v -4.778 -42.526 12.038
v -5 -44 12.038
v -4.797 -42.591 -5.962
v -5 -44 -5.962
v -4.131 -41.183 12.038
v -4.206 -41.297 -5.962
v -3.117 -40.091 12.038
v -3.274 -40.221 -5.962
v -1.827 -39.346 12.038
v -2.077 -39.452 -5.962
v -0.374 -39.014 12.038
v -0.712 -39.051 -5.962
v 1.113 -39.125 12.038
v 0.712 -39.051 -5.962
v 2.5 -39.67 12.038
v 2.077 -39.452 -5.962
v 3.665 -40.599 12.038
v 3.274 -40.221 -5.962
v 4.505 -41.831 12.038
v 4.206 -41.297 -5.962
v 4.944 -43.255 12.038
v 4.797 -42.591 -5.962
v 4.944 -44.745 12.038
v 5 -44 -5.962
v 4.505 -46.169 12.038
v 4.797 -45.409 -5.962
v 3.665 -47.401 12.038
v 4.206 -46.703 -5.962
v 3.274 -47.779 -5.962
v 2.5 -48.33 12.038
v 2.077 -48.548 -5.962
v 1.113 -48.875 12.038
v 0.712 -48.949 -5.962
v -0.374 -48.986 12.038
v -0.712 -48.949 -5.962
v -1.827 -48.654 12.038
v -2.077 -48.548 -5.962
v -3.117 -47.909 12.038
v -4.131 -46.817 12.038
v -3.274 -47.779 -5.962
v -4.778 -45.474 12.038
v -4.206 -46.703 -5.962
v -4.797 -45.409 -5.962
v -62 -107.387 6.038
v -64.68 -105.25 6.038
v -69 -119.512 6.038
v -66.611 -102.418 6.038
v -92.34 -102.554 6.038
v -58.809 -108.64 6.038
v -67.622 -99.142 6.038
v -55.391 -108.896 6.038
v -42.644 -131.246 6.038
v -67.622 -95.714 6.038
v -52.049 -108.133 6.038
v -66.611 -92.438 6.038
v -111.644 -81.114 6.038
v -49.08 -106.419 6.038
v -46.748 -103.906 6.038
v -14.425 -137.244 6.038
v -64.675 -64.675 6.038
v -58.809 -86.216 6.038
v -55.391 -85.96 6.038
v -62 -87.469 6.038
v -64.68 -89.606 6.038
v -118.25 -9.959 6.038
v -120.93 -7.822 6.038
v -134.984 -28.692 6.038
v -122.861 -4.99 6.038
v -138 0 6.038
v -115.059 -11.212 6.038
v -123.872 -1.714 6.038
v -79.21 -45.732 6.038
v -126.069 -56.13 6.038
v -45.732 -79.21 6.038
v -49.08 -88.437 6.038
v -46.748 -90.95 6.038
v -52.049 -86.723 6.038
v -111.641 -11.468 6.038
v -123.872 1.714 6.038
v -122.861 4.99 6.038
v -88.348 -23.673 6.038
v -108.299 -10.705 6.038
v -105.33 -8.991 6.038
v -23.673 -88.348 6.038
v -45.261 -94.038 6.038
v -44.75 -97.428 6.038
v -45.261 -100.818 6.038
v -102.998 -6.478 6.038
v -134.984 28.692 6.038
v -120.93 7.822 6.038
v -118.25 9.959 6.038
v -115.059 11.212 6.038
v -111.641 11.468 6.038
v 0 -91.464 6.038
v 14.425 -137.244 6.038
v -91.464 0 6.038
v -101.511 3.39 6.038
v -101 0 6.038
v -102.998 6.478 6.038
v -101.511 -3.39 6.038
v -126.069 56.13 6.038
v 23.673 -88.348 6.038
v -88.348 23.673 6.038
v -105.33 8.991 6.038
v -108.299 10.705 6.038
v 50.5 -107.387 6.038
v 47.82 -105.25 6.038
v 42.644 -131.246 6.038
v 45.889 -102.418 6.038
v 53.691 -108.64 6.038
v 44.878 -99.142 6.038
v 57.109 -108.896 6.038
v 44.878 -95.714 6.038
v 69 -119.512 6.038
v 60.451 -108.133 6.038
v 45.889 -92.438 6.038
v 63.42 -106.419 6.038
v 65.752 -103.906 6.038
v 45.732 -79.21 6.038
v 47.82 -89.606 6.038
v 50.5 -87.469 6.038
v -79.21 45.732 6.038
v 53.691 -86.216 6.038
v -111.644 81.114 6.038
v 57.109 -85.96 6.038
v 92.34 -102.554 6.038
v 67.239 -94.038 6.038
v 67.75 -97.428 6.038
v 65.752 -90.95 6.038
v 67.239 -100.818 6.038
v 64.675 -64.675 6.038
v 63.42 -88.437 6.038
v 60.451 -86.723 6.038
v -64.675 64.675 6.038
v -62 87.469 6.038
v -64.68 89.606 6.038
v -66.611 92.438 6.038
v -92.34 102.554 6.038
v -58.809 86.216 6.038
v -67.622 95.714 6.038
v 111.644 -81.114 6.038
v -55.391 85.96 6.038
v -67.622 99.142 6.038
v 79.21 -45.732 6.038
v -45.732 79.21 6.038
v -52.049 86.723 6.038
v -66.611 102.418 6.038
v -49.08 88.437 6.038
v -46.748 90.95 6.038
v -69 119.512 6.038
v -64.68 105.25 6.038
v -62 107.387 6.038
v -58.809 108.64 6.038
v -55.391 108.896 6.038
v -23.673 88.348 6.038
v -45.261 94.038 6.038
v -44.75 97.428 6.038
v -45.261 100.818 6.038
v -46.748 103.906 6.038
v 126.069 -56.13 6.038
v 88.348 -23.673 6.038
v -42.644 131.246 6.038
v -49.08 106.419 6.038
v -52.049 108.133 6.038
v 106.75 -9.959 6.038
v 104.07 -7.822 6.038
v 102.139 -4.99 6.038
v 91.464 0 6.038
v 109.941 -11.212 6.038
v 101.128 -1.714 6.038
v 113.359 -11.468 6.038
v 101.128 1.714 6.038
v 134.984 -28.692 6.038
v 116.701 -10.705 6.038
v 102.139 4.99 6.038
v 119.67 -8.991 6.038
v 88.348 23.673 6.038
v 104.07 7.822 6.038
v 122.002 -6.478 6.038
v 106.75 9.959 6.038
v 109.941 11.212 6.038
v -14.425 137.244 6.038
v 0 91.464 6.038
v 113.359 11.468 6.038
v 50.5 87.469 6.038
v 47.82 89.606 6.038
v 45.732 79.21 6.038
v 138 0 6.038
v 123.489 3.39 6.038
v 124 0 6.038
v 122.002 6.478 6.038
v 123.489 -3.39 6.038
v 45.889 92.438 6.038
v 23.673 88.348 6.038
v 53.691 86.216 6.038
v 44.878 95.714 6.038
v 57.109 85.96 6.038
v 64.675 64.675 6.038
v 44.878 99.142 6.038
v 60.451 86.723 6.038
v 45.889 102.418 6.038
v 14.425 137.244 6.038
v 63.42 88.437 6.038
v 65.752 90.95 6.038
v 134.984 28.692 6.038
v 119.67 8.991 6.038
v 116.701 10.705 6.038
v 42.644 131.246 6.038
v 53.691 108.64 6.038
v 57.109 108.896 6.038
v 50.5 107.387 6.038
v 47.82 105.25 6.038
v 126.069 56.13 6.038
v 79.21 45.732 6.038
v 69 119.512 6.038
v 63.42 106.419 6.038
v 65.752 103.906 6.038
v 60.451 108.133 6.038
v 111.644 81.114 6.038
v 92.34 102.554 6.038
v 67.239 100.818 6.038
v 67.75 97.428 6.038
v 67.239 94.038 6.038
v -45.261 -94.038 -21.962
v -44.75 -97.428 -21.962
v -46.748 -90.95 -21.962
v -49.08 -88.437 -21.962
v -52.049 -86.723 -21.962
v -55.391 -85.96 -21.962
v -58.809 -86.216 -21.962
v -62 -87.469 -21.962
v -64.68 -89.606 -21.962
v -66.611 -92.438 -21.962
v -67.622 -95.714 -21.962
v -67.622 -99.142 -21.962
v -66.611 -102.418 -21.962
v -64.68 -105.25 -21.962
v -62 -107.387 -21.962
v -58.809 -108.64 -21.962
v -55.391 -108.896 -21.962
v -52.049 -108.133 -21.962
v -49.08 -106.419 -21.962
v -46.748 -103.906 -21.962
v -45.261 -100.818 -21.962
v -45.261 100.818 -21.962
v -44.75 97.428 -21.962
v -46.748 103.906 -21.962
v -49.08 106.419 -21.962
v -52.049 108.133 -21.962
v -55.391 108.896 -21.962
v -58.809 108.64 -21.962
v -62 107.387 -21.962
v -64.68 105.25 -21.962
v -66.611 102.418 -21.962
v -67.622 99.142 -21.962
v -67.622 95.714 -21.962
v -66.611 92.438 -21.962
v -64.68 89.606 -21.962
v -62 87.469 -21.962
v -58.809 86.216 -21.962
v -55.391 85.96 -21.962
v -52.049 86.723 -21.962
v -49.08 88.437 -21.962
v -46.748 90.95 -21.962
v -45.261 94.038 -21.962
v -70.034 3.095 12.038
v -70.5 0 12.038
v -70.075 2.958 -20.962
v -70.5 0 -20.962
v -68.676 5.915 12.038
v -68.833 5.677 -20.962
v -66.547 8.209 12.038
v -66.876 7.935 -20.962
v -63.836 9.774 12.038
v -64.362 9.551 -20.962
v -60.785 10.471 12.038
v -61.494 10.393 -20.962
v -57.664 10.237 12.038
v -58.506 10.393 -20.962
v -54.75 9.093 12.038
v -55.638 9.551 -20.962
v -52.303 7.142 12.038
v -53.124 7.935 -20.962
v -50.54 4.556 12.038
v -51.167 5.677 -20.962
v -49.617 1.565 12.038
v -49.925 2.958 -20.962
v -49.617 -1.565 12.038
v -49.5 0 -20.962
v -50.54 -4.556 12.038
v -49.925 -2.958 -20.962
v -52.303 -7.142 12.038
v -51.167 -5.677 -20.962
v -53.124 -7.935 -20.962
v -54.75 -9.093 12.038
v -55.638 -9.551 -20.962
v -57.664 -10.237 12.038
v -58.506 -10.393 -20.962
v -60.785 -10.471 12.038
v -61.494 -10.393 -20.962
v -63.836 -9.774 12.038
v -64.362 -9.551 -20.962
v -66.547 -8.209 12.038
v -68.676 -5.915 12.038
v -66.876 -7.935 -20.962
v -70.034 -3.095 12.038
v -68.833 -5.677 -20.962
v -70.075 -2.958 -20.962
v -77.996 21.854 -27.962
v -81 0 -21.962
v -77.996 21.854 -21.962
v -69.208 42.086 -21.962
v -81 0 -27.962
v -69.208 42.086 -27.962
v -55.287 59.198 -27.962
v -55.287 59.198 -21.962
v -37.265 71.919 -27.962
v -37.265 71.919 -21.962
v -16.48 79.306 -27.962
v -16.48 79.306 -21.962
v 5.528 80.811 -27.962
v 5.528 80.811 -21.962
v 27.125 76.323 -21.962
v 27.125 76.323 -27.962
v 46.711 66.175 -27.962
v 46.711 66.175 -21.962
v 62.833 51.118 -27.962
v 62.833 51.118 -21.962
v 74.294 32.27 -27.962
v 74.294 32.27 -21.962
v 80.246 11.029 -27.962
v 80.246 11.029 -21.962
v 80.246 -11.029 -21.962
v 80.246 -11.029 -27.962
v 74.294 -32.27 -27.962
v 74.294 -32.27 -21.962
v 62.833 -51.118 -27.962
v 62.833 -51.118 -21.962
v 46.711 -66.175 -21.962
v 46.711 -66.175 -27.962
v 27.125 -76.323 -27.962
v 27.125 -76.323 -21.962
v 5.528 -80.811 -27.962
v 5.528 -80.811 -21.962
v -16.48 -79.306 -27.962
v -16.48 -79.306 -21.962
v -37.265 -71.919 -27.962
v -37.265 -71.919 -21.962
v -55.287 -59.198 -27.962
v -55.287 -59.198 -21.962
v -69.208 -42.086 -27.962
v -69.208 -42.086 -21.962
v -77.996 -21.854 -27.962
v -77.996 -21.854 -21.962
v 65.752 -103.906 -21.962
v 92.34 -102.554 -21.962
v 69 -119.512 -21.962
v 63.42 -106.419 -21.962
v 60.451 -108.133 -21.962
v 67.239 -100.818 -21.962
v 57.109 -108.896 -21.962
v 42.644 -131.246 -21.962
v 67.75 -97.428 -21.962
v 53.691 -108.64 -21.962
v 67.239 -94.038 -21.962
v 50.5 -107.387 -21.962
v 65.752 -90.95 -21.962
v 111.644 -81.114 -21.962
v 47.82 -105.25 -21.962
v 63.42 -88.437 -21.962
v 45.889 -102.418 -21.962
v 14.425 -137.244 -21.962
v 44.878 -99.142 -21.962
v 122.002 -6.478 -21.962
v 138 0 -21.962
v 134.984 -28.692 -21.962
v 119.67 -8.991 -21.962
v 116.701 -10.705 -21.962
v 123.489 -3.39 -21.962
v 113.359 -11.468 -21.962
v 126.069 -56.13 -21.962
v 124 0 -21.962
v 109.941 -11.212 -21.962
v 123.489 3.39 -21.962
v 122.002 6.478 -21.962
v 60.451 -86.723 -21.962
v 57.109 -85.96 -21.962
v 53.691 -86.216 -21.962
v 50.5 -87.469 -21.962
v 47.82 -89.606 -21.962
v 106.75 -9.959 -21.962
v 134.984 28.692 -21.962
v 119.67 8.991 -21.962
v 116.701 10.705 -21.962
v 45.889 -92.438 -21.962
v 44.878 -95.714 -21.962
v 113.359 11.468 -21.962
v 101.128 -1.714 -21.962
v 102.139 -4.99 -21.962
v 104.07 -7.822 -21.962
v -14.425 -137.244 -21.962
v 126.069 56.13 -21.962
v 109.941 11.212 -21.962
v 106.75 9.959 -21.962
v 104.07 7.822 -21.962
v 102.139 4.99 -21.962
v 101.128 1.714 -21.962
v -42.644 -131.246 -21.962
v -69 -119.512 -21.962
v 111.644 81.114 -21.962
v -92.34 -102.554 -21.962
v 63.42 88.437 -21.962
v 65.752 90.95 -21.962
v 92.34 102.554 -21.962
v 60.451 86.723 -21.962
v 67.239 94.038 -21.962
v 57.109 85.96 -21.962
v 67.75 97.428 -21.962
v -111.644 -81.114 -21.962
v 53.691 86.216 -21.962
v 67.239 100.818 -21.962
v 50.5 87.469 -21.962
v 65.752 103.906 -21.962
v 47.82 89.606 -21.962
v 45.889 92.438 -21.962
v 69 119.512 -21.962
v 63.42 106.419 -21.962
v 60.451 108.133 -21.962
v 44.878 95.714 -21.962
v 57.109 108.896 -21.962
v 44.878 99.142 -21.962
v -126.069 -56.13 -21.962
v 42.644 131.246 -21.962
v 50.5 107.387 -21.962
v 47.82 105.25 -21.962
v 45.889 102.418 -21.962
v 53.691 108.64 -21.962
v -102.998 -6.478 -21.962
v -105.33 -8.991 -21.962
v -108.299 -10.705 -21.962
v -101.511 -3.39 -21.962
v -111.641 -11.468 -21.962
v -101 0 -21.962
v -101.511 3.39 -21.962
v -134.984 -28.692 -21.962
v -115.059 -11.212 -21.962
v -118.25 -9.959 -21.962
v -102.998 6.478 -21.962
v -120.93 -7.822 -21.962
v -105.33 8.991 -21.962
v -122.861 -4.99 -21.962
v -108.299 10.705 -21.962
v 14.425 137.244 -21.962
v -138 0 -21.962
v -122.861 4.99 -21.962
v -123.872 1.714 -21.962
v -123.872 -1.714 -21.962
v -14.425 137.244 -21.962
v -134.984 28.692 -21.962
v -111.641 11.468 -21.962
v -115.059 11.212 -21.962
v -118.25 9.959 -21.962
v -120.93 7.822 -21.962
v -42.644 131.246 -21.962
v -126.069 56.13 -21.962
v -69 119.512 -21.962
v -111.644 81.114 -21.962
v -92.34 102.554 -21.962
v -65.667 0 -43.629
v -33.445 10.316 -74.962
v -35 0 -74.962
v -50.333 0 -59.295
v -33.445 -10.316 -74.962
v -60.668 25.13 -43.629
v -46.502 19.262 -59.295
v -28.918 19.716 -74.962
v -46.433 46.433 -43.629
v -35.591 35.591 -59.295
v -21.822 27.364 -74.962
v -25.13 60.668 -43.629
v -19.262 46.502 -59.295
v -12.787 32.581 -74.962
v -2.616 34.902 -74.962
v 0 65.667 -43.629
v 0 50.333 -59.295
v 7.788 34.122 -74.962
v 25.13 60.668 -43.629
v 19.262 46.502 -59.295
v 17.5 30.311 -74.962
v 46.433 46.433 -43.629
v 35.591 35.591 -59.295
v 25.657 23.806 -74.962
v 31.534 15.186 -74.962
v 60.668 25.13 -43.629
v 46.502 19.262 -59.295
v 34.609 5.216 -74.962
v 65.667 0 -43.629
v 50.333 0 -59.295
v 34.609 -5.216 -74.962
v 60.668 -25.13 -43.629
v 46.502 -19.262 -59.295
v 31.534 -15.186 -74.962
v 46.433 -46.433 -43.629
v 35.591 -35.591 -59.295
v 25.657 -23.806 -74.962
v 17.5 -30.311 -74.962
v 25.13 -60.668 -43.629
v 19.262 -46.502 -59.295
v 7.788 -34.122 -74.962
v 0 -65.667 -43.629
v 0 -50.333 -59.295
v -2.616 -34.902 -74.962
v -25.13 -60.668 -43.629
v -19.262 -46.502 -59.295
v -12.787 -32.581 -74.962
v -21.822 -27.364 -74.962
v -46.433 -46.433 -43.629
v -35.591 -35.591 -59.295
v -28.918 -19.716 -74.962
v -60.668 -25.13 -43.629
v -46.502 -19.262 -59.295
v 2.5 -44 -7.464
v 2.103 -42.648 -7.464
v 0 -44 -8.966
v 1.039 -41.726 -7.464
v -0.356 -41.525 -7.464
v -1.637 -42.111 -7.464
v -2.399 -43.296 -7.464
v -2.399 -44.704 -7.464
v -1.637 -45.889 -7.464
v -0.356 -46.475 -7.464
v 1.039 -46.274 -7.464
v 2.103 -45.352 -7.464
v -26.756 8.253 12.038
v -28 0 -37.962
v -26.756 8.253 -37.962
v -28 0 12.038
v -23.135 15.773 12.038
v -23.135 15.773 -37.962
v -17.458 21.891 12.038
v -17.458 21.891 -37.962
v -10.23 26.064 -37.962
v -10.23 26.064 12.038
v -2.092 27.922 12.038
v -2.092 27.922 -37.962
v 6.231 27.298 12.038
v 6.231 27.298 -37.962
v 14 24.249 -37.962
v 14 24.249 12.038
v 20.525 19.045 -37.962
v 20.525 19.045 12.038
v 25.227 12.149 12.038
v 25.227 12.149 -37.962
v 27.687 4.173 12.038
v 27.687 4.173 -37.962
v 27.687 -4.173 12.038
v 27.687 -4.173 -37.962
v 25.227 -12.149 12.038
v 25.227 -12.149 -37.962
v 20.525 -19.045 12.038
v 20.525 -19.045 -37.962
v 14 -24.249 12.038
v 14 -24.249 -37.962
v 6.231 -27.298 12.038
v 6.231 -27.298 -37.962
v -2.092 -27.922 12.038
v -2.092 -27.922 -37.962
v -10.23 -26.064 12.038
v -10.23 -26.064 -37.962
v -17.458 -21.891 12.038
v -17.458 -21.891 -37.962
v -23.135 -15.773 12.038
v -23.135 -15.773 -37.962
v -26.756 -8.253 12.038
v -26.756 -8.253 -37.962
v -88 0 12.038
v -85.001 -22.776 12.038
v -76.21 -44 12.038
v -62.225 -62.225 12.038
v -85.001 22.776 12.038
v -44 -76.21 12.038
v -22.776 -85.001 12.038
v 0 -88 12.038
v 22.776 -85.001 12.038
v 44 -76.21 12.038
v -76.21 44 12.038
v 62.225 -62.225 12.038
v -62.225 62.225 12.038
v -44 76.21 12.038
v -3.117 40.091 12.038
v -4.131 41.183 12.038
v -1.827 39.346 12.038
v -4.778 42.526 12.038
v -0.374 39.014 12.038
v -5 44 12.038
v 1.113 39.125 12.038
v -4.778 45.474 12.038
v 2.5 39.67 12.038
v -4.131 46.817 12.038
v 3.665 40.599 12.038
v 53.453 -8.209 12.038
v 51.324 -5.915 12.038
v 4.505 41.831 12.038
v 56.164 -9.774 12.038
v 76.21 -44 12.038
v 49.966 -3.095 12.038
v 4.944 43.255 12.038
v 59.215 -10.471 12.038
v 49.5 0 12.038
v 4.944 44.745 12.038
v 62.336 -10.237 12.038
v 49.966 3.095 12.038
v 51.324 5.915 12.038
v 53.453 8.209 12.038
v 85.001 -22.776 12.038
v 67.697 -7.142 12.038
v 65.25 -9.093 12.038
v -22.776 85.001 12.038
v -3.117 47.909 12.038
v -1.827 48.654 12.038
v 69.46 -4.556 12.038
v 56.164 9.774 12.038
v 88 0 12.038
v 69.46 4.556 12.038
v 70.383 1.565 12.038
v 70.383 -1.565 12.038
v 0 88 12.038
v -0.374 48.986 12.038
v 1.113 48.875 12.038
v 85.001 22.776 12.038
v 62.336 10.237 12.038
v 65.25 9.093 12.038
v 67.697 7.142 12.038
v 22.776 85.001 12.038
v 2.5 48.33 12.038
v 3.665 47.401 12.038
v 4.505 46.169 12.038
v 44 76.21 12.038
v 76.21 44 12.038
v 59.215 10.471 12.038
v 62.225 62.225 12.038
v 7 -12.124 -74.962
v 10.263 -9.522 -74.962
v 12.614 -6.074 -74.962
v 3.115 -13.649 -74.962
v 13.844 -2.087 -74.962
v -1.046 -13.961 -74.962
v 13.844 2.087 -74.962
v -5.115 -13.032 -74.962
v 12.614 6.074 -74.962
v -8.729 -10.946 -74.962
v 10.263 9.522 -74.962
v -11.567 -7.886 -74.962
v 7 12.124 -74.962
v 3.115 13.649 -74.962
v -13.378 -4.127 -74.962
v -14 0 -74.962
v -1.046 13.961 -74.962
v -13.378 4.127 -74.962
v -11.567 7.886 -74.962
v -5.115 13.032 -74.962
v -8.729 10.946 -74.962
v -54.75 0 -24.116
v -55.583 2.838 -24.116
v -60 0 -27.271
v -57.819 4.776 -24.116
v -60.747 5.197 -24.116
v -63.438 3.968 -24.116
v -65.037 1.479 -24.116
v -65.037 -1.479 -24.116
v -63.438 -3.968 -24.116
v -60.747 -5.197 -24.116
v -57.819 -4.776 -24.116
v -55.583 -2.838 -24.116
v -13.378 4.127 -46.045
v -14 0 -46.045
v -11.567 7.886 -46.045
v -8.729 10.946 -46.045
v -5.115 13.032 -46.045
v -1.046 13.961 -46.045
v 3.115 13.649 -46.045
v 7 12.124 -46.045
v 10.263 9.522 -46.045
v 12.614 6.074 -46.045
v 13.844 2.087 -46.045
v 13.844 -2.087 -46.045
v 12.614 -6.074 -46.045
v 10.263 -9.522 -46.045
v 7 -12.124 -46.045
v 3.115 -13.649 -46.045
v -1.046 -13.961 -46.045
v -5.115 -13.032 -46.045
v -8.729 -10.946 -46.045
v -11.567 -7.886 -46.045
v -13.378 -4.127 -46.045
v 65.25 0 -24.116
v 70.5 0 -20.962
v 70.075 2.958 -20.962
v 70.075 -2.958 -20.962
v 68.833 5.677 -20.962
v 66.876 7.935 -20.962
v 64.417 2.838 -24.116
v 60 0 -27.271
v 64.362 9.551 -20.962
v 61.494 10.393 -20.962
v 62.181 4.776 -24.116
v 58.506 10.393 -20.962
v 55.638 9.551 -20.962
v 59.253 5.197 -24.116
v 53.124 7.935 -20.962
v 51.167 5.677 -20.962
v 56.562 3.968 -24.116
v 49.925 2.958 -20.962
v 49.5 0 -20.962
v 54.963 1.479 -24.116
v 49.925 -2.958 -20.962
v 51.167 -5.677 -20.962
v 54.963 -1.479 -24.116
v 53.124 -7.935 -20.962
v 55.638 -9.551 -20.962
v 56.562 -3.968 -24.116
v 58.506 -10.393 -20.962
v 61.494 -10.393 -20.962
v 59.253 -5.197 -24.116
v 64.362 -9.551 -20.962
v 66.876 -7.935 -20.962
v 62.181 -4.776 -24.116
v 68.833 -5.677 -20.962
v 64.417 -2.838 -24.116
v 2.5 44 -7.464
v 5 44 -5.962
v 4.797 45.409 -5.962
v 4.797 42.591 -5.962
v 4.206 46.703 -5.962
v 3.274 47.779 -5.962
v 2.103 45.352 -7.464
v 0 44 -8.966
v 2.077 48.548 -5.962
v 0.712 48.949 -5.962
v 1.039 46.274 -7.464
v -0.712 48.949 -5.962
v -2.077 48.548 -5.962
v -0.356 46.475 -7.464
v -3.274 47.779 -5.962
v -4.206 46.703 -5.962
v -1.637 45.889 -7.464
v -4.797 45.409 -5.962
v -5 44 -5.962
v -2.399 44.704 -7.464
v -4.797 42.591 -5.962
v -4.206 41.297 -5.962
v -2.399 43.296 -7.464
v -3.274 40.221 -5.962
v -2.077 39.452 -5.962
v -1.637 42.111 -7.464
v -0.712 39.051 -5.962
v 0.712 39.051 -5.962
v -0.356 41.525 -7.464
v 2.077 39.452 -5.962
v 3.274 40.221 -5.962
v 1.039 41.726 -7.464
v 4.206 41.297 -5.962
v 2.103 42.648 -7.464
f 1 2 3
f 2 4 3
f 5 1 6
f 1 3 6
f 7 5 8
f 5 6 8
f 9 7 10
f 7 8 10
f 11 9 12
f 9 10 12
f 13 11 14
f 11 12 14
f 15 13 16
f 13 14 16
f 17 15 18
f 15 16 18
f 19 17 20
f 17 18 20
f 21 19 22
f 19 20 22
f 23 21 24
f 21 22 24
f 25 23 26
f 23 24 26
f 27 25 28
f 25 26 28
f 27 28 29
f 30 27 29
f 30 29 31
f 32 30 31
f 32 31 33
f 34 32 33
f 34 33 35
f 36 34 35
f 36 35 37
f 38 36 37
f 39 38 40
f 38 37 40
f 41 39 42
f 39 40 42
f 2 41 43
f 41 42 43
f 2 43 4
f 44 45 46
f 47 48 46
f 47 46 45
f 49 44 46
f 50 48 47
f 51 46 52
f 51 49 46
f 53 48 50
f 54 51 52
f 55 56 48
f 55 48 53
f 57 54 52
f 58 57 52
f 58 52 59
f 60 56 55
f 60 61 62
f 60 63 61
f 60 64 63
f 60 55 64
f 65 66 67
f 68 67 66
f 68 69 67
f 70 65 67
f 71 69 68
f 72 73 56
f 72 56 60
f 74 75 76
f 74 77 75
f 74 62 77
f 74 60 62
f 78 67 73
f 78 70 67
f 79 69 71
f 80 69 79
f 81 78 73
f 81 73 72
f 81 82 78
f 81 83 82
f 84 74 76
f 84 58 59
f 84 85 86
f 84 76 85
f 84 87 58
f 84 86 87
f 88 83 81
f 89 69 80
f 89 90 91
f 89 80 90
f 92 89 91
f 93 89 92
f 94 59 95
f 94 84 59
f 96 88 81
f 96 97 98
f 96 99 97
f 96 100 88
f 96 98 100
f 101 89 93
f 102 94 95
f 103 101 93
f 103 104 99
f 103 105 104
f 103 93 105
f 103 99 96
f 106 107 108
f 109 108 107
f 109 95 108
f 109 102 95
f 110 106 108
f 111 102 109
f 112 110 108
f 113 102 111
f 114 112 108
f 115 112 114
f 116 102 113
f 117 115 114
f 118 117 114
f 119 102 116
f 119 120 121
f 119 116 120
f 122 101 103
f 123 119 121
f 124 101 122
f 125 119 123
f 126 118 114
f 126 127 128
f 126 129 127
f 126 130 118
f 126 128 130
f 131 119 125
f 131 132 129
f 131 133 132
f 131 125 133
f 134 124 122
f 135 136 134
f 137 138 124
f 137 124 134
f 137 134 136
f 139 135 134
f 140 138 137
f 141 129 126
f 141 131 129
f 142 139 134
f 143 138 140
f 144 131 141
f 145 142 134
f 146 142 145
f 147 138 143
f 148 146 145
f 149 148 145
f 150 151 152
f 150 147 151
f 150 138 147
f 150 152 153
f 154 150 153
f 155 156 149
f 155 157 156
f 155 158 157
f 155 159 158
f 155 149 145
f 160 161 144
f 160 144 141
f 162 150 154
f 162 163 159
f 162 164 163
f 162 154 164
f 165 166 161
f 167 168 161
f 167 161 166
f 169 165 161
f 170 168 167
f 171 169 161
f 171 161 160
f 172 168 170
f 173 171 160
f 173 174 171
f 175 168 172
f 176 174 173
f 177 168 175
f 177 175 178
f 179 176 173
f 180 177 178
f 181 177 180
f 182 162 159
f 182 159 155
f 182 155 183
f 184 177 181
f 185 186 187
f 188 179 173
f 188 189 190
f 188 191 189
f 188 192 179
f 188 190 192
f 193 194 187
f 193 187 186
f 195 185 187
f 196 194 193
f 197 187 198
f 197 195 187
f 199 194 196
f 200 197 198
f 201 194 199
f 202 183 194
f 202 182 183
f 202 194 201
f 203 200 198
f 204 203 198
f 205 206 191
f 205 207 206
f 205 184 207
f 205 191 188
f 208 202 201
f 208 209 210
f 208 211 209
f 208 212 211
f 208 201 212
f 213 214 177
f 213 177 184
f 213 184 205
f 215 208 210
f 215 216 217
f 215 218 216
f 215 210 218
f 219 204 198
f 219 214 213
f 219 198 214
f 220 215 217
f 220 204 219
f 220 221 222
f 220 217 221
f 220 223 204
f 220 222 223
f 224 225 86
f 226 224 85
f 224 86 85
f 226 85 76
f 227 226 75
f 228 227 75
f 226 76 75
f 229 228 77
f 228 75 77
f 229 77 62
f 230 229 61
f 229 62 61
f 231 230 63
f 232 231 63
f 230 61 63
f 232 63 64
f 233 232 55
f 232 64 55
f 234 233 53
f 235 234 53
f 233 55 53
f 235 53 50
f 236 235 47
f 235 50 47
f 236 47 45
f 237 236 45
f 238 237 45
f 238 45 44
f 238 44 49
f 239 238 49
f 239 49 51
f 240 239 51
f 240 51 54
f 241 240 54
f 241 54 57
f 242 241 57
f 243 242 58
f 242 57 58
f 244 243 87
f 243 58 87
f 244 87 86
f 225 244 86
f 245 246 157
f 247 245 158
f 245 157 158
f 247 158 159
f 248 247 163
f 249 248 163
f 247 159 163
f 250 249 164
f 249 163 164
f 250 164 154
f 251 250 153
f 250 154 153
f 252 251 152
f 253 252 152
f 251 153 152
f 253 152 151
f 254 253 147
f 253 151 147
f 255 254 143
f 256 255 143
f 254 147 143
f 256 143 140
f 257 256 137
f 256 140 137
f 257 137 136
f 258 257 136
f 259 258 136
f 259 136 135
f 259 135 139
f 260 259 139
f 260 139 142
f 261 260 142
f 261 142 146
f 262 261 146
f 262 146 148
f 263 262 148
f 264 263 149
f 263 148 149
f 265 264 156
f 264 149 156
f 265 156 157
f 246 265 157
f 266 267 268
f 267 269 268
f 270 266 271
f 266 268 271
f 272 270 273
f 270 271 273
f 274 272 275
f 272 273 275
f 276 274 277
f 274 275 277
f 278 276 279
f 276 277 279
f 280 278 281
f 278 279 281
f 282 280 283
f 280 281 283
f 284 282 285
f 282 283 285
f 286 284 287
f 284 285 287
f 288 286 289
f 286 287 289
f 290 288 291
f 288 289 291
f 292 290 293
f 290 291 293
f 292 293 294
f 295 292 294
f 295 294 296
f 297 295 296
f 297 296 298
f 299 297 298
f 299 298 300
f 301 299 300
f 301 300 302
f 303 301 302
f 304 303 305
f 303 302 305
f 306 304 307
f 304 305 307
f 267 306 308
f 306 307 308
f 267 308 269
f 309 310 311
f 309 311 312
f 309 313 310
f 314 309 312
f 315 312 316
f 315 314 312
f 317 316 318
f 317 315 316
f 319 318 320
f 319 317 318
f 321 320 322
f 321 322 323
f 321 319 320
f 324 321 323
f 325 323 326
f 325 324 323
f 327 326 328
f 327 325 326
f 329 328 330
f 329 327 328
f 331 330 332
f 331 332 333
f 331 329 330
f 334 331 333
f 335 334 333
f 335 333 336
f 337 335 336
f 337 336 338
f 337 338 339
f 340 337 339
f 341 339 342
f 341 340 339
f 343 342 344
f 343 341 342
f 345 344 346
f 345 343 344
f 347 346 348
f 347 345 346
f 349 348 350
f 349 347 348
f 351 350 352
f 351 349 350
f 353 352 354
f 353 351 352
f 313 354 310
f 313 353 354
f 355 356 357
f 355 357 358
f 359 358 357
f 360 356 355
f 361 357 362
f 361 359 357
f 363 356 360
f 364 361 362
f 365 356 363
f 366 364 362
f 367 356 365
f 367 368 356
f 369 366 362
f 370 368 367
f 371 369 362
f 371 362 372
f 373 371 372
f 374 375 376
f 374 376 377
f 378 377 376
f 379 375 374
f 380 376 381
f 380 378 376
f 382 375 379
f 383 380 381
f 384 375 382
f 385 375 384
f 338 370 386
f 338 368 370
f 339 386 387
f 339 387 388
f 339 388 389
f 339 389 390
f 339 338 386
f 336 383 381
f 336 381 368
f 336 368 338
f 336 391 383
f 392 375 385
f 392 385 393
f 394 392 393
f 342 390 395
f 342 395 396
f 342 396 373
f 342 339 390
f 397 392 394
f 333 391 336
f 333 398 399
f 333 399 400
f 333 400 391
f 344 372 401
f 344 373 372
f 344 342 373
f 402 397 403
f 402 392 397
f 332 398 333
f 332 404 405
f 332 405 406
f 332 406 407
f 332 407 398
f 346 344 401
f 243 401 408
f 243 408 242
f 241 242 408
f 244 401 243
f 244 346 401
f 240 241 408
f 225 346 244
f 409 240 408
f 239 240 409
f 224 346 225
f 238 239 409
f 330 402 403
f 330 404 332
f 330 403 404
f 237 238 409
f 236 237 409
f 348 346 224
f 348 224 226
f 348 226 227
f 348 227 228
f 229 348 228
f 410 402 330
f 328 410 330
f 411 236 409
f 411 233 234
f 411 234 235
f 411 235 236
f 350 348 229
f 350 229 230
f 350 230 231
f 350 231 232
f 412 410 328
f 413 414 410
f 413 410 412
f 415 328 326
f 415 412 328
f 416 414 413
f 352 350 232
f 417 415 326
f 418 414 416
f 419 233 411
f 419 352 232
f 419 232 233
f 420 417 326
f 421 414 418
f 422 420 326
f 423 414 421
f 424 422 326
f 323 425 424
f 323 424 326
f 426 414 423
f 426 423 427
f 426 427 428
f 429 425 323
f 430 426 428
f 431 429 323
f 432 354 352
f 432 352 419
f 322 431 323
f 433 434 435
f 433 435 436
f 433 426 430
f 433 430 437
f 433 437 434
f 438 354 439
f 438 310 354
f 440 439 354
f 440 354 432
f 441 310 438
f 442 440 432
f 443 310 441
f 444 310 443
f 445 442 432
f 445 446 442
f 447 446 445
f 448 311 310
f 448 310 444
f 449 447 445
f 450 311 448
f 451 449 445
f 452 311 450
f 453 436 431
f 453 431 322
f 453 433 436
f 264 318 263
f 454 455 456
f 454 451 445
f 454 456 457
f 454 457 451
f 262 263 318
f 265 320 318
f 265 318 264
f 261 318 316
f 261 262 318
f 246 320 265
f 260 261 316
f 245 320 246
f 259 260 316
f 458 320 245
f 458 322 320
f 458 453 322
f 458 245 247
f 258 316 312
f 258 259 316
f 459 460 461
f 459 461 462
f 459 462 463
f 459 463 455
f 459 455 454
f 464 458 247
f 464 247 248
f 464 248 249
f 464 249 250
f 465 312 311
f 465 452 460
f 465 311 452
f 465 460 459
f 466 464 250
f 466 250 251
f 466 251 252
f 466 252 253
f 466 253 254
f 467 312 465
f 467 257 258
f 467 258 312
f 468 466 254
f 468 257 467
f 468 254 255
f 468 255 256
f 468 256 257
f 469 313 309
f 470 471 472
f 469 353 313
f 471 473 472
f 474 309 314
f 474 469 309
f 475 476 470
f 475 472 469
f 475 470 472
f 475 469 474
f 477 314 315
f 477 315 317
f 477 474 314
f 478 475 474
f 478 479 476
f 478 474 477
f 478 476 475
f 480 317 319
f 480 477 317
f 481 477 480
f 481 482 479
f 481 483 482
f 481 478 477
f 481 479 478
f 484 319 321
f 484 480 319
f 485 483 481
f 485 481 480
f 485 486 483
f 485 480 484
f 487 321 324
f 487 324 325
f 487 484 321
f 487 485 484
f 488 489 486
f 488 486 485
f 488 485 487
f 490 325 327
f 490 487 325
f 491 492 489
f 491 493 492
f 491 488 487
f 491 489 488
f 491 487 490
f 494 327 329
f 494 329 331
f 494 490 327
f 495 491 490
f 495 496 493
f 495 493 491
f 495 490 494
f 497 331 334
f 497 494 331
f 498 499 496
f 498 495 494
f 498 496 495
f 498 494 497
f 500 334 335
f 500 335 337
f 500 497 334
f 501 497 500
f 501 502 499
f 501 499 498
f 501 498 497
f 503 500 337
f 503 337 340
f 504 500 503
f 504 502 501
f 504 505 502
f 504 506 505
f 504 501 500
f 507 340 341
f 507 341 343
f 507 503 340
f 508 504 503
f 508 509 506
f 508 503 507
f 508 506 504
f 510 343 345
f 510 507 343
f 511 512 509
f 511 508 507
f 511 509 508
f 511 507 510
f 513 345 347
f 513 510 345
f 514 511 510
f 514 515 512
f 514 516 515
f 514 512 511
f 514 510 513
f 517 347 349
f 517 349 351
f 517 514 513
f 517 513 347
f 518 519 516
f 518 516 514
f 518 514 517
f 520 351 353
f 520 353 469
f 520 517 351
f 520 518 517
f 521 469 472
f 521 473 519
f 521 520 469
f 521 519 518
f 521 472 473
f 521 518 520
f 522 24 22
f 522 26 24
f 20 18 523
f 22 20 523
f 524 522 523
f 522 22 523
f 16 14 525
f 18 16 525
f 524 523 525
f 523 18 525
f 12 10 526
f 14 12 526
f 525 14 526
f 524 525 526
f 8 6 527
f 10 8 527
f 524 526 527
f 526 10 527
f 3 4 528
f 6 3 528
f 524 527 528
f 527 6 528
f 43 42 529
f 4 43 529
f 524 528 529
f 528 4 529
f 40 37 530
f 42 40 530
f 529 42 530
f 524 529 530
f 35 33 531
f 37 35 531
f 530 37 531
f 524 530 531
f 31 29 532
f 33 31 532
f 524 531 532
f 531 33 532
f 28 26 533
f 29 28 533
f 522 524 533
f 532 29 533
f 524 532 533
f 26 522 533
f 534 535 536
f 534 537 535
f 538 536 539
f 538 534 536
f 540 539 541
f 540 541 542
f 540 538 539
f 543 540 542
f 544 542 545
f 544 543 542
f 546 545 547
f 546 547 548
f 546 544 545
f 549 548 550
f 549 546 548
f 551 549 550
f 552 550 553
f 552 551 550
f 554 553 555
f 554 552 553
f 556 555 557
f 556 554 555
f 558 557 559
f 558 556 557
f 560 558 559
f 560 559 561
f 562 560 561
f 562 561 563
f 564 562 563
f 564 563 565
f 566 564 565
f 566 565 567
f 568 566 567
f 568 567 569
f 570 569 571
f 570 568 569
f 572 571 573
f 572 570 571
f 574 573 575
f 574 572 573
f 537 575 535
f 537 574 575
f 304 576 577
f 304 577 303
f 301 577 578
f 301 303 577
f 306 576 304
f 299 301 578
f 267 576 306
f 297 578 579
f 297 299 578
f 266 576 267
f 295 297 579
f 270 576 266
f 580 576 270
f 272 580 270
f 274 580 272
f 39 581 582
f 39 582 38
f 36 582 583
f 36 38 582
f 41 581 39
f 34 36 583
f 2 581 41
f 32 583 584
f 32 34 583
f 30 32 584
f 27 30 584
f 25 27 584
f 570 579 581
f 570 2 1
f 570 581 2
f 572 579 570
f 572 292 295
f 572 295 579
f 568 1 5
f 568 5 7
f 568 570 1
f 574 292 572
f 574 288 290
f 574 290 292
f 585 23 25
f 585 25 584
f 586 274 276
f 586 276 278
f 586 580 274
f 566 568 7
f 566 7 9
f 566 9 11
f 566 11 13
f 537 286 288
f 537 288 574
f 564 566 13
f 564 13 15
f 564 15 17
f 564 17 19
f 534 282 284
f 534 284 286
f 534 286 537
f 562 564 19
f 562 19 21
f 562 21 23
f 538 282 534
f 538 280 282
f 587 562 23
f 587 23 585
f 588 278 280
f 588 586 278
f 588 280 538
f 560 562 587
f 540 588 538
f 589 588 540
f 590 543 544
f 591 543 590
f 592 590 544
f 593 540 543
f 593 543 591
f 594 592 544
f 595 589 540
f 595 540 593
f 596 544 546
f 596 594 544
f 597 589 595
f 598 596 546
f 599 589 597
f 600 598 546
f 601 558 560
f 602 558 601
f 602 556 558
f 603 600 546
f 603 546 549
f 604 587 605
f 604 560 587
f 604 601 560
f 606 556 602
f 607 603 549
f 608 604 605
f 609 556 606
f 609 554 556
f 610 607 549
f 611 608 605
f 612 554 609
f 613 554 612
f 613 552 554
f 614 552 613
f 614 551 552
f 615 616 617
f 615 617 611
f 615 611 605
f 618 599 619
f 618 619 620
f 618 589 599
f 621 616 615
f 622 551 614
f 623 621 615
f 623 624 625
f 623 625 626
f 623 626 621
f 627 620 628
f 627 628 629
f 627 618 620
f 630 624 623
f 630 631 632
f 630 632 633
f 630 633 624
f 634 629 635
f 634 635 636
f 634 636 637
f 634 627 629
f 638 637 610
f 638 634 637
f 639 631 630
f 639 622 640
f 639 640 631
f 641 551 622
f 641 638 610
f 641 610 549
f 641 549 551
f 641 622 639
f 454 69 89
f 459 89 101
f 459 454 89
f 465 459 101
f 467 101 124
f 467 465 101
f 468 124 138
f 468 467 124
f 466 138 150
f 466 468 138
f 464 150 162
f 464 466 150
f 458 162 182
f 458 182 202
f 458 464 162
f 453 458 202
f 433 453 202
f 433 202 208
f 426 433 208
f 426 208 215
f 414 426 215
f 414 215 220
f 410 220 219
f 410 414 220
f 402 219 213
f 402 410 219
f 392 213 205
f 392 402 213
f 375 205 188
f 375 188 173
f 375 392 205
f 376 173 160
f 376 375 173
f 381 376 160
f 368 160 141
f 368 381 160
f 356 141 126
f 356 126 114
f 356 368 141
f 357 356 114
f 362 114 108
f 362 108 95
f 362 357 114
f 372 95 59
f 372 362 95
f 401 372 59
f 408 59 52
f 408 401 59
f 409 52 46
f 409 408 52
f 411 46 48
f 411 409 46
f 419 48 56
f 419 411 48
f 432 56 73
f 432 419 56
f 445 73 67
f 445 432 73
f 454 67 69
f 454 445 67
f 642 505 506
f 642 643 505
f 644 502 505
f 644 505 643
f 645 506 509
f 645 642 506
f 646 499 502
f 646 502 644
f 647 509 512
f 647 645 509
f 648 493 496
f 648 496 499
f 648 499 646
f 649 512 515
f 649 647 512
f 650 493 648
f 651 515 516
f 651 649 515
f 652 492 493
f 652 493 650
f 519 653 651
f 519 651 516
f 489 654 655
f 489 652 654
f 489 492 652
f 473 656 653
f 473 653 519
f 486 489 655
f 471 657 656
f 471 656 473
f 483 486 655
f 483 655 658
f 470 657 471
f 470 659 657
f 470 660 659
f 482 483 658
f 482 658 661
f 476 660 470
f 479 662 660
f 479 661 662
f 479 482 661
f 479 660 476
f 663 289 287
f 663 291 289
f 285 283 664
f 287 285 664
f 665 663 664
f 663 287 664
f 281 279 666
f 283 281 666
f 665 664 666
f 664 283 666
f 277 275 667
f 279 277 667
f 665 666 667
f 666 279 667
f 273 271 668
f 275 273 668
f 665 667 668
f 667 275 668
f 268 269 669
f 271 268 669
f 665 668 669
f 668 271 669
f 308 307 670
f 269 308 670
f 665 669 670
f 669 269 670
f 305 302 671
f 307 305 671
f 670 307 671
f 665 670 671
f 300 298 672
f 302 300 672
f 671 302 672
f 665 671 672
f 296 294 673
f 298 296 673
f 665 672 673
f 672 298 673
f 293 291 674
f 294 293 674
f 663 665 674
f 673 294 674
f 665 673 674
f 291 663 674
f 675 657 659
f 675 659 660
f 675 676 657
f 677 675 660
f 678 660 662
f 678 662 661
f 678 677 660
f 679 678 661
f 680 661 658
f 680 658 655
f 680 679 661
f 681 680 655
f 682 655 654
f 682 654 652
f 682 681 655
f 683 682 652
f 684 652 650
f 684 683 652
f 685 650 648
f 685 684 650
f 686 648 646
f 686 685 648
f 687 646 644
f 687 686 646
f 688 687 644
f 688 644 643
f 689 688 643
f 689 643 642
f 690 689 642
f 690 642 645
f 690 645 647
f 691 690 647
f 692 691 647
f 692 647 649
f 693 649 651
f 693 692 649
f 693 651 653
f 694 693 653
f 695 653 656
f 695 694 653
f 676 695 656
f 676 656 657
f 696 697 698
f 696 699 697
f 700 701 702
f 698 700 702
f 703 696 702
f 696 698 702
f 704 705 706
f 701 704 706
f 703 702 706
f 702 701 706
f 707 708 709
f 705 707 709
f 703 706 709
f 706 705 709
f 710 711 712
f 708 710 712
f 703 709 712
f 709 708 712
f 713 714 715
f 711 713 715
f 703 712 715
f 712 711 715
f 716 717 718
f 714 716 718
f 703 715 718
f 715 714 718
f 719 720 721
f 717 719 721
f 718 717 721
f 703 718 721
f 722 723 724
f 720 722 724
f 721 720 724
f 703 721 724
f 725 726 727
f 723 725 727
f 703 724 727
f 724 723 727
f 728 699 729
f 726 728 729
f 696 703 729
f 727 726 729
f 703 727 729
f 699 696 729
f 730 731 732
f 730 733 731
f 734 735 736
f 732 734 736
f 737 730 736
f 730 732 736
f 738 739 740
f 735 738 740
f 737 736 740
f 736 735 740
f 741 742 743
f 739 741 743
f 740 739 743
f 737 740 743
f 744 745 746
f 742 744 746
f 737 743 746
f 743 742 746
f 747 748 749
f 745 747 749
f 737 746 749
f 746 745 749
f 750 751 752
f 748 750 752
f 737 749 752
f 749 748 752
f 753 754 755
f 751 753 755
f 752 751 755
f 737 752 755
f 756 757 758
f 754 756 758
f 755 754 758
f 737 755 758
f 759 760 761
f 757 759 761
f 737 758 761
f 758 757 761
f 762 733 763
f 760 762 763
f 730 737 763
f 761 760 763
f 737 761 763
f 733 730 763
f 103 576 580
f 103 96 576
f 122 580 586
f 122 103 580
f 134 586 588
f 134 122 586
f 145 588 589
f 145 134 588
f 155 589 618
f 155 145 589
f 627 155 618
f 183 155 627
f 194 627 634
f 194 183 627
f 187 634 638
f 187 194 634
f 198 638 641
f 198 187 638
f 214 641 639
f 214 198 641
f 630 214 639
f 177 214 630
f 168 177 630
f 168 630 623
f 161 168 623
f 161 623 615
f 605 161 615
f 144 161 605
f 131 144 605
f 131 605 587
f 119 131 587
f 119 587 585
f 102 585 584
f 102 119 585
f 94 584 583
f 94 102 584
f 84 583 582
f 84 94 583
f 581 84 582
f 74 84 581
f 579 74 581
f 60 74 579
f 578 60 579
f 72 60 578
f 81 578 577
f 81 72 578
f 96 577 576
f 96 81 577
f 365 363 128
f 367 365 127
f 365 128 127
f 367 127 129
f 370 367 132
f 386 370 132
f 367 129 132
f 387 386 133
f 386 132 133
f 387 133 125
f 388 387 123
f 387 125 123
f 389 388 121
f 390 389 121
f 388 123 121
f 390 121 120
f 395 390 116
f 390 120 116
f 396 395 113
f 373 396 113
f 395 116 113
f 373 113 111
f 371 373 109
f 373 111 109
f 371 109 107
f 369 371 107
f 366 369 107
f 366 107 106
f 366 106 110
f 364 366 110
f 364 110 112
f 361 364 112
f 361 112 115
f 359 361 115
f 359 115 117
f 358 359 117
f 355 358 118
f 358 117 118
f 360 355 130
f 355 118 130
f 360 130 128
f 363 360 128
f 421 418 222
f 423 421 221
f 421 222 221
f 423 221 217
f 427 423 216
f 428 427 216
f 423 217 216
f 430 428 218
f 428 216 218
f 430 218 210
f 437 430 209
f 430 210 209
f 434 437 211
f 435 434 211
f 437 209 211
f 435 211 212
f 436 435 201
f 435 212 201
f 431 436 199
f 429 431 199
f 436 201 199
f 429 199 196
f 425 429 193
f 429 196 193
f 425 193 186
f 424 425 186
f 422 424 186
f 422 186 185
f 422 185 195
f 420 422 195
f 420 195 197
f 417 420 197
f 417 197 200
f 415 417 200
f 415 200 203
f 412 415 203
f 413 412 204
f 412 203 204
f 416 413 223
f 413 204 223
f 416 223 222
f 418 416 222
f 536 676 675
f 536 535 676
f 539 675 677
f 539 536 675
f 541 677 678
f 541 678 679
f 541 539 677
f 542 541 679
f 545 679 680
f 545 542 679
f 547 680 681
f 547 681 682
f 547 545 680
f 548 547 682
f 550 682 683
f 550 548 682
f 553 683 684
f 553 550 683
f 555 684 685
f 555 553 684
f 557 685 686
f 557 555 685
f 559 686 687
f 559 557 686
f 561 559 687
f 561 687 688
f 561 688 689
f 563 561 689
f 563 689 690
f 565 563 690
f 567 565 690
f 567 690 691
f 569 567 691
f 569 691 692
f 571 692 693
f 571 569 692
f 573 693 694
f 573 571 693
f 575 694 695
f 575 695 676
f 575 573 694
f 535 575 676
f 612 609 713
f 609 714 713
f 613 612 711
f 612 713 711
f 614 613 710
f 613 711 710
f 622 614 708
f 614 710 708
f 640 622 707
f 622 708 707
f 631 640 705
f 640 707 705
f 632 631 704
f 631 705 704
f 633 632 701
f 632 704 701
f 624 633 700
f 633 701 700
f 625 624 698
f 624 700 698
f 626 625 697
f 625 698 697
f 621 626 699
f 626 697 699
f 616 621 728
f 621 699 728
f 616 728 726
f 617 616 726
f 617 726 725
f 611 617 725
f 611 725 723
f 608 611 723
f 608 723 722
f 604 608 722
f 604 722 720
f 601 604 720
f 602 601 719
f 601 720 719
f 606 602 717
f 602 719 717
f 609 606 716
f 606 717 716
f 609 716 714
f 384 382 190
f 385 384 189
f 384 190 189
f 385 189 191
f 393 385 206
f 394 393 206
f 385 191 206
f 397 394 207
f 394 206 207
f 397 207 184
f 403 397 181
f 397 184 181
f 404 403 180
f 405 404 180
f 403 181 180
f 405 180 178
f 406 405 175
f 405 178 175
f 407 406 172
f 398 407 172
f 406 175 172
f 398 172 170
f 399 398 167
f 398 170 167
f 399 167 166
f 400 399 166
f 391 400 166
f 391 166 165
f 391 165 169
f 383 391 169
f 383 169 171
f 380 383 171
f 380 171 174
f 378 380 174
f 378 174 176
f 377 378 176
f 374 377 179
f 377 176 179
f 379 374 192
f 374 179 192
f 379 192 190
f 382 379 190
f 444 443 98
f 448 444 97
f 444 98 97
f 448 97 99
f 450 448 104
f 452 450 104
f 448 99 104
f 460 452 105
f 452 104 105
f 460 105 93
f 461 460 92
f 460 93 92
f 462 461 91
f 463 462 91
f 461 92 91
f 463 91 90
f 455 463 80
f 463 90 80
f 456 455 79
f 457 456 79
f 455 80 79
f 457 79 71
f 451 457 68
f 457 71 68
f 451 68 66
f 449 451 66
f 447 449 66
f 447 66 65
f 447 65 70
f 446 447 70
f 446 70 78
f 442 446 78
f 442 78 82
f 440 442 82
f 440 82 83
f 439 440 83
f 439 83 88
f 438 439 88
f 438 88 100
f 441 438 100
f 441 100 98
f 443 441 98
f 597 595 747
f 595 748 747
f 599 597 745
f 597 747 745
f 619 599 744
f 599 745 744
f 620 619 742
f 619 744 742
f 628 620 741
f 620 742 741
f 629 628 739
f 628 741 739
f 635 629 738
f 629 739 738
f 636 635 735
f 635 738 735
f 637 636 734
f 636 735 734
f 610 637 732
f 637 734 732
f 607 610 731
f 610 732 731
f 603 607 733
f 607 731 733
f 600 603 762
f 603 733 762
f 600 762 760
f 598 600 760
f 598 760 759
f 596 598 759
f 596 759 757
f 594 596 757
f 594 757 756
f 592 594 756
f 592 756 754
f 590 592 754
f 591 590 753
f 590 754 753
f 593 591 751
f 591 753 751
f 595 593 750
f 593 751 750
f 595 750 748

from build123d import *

# Parameters (mm, degrees)
F2_R     = 11.5
F3_DEPTH = 81.001
F4_DEPTH = 28
F6_D     = 21
F6_DEPTH = 33
F6_TIP   = 6.3090364998
F7_D     = 10
F7_DEPTH = 18
F7_TIP   = 3.0043030951


with BuildPart() as f1:
    # F0 (on Front) → F1 (revolve)
    with BuildSketch(Plane.XZ):
        Polygon((-28, -37.9619441777), (-28, 12.0380558223), (-88, 12.0380558223), (-91.4641016151, 6.0380558223), (-138, 6.0380558223), (-138, -21.9619441777), (-81, -21.9619441777), (-81, -27.9619441777), (-35, -74.9619441777), (-14, -74.9619441777), (-14, -46.0448479464), align=None)
    revolve(axis=Axis((0, 0, -17.8461521864), (0, 0, -1)))

    # F2 (on face) → F3 (cut, through all)
    with BuildSketch(Plane.XY.offset(6.0380558223)):
        with Locations((-112.5, 0)):
            Circle(F2_R)
    extrude(amount=-F3_DEPTH, mode=Mode.SUBTRACT)

    # F2 (on face) → F4 (cut, through all)
    with BuildSketch(Plane.XY.offset(6.0380558223)):
        with Locations((-56.25, 97.4278579257)):
            Circle(F2_R)
        with Locations((56.25, 97.4278579257)):
            Circle(F2_R)
        with Locations((112.5, 0)):
            Circle(F2_R)
        with Locations((56.25, -97.4278579257)):
            Circle(F2_R)
        with Locations((-56.25, -97.4278579257)):
            Circle(F2_R)
    extrude(amount=-F4_DEPTH, mode=Mode.SUBTRACT)

    # F6
    with Locations(Plane.XY.offset(12.0380558223)):
        with Locations((-60, 0), (60, 0)):
            Hole(F6_D / 2, depth=F6_DEPTH)
            with Locations((0, 0, -(F6_DEPTH + F6_TIP / 2))):  # 118° drill point
                Cone(0, F6_D / 2, F6_TIP, mode=Mode.SUBTRACT)

    # F7
    with Locations(Plane.XY.offset(12.0380558223)):
        with Locations((0, 44), (0, -44)):
            Hole(F7_D / 2, depth=F7_DEPTH)
            with Locations((0, 0, -(F7_DEPTH + F7_TIP / 2))):  # 118° drill point
                Cone(0, F7_D / 2, F7_TIP, mode=Mode.SUBTRACT)


solid = f1.part
